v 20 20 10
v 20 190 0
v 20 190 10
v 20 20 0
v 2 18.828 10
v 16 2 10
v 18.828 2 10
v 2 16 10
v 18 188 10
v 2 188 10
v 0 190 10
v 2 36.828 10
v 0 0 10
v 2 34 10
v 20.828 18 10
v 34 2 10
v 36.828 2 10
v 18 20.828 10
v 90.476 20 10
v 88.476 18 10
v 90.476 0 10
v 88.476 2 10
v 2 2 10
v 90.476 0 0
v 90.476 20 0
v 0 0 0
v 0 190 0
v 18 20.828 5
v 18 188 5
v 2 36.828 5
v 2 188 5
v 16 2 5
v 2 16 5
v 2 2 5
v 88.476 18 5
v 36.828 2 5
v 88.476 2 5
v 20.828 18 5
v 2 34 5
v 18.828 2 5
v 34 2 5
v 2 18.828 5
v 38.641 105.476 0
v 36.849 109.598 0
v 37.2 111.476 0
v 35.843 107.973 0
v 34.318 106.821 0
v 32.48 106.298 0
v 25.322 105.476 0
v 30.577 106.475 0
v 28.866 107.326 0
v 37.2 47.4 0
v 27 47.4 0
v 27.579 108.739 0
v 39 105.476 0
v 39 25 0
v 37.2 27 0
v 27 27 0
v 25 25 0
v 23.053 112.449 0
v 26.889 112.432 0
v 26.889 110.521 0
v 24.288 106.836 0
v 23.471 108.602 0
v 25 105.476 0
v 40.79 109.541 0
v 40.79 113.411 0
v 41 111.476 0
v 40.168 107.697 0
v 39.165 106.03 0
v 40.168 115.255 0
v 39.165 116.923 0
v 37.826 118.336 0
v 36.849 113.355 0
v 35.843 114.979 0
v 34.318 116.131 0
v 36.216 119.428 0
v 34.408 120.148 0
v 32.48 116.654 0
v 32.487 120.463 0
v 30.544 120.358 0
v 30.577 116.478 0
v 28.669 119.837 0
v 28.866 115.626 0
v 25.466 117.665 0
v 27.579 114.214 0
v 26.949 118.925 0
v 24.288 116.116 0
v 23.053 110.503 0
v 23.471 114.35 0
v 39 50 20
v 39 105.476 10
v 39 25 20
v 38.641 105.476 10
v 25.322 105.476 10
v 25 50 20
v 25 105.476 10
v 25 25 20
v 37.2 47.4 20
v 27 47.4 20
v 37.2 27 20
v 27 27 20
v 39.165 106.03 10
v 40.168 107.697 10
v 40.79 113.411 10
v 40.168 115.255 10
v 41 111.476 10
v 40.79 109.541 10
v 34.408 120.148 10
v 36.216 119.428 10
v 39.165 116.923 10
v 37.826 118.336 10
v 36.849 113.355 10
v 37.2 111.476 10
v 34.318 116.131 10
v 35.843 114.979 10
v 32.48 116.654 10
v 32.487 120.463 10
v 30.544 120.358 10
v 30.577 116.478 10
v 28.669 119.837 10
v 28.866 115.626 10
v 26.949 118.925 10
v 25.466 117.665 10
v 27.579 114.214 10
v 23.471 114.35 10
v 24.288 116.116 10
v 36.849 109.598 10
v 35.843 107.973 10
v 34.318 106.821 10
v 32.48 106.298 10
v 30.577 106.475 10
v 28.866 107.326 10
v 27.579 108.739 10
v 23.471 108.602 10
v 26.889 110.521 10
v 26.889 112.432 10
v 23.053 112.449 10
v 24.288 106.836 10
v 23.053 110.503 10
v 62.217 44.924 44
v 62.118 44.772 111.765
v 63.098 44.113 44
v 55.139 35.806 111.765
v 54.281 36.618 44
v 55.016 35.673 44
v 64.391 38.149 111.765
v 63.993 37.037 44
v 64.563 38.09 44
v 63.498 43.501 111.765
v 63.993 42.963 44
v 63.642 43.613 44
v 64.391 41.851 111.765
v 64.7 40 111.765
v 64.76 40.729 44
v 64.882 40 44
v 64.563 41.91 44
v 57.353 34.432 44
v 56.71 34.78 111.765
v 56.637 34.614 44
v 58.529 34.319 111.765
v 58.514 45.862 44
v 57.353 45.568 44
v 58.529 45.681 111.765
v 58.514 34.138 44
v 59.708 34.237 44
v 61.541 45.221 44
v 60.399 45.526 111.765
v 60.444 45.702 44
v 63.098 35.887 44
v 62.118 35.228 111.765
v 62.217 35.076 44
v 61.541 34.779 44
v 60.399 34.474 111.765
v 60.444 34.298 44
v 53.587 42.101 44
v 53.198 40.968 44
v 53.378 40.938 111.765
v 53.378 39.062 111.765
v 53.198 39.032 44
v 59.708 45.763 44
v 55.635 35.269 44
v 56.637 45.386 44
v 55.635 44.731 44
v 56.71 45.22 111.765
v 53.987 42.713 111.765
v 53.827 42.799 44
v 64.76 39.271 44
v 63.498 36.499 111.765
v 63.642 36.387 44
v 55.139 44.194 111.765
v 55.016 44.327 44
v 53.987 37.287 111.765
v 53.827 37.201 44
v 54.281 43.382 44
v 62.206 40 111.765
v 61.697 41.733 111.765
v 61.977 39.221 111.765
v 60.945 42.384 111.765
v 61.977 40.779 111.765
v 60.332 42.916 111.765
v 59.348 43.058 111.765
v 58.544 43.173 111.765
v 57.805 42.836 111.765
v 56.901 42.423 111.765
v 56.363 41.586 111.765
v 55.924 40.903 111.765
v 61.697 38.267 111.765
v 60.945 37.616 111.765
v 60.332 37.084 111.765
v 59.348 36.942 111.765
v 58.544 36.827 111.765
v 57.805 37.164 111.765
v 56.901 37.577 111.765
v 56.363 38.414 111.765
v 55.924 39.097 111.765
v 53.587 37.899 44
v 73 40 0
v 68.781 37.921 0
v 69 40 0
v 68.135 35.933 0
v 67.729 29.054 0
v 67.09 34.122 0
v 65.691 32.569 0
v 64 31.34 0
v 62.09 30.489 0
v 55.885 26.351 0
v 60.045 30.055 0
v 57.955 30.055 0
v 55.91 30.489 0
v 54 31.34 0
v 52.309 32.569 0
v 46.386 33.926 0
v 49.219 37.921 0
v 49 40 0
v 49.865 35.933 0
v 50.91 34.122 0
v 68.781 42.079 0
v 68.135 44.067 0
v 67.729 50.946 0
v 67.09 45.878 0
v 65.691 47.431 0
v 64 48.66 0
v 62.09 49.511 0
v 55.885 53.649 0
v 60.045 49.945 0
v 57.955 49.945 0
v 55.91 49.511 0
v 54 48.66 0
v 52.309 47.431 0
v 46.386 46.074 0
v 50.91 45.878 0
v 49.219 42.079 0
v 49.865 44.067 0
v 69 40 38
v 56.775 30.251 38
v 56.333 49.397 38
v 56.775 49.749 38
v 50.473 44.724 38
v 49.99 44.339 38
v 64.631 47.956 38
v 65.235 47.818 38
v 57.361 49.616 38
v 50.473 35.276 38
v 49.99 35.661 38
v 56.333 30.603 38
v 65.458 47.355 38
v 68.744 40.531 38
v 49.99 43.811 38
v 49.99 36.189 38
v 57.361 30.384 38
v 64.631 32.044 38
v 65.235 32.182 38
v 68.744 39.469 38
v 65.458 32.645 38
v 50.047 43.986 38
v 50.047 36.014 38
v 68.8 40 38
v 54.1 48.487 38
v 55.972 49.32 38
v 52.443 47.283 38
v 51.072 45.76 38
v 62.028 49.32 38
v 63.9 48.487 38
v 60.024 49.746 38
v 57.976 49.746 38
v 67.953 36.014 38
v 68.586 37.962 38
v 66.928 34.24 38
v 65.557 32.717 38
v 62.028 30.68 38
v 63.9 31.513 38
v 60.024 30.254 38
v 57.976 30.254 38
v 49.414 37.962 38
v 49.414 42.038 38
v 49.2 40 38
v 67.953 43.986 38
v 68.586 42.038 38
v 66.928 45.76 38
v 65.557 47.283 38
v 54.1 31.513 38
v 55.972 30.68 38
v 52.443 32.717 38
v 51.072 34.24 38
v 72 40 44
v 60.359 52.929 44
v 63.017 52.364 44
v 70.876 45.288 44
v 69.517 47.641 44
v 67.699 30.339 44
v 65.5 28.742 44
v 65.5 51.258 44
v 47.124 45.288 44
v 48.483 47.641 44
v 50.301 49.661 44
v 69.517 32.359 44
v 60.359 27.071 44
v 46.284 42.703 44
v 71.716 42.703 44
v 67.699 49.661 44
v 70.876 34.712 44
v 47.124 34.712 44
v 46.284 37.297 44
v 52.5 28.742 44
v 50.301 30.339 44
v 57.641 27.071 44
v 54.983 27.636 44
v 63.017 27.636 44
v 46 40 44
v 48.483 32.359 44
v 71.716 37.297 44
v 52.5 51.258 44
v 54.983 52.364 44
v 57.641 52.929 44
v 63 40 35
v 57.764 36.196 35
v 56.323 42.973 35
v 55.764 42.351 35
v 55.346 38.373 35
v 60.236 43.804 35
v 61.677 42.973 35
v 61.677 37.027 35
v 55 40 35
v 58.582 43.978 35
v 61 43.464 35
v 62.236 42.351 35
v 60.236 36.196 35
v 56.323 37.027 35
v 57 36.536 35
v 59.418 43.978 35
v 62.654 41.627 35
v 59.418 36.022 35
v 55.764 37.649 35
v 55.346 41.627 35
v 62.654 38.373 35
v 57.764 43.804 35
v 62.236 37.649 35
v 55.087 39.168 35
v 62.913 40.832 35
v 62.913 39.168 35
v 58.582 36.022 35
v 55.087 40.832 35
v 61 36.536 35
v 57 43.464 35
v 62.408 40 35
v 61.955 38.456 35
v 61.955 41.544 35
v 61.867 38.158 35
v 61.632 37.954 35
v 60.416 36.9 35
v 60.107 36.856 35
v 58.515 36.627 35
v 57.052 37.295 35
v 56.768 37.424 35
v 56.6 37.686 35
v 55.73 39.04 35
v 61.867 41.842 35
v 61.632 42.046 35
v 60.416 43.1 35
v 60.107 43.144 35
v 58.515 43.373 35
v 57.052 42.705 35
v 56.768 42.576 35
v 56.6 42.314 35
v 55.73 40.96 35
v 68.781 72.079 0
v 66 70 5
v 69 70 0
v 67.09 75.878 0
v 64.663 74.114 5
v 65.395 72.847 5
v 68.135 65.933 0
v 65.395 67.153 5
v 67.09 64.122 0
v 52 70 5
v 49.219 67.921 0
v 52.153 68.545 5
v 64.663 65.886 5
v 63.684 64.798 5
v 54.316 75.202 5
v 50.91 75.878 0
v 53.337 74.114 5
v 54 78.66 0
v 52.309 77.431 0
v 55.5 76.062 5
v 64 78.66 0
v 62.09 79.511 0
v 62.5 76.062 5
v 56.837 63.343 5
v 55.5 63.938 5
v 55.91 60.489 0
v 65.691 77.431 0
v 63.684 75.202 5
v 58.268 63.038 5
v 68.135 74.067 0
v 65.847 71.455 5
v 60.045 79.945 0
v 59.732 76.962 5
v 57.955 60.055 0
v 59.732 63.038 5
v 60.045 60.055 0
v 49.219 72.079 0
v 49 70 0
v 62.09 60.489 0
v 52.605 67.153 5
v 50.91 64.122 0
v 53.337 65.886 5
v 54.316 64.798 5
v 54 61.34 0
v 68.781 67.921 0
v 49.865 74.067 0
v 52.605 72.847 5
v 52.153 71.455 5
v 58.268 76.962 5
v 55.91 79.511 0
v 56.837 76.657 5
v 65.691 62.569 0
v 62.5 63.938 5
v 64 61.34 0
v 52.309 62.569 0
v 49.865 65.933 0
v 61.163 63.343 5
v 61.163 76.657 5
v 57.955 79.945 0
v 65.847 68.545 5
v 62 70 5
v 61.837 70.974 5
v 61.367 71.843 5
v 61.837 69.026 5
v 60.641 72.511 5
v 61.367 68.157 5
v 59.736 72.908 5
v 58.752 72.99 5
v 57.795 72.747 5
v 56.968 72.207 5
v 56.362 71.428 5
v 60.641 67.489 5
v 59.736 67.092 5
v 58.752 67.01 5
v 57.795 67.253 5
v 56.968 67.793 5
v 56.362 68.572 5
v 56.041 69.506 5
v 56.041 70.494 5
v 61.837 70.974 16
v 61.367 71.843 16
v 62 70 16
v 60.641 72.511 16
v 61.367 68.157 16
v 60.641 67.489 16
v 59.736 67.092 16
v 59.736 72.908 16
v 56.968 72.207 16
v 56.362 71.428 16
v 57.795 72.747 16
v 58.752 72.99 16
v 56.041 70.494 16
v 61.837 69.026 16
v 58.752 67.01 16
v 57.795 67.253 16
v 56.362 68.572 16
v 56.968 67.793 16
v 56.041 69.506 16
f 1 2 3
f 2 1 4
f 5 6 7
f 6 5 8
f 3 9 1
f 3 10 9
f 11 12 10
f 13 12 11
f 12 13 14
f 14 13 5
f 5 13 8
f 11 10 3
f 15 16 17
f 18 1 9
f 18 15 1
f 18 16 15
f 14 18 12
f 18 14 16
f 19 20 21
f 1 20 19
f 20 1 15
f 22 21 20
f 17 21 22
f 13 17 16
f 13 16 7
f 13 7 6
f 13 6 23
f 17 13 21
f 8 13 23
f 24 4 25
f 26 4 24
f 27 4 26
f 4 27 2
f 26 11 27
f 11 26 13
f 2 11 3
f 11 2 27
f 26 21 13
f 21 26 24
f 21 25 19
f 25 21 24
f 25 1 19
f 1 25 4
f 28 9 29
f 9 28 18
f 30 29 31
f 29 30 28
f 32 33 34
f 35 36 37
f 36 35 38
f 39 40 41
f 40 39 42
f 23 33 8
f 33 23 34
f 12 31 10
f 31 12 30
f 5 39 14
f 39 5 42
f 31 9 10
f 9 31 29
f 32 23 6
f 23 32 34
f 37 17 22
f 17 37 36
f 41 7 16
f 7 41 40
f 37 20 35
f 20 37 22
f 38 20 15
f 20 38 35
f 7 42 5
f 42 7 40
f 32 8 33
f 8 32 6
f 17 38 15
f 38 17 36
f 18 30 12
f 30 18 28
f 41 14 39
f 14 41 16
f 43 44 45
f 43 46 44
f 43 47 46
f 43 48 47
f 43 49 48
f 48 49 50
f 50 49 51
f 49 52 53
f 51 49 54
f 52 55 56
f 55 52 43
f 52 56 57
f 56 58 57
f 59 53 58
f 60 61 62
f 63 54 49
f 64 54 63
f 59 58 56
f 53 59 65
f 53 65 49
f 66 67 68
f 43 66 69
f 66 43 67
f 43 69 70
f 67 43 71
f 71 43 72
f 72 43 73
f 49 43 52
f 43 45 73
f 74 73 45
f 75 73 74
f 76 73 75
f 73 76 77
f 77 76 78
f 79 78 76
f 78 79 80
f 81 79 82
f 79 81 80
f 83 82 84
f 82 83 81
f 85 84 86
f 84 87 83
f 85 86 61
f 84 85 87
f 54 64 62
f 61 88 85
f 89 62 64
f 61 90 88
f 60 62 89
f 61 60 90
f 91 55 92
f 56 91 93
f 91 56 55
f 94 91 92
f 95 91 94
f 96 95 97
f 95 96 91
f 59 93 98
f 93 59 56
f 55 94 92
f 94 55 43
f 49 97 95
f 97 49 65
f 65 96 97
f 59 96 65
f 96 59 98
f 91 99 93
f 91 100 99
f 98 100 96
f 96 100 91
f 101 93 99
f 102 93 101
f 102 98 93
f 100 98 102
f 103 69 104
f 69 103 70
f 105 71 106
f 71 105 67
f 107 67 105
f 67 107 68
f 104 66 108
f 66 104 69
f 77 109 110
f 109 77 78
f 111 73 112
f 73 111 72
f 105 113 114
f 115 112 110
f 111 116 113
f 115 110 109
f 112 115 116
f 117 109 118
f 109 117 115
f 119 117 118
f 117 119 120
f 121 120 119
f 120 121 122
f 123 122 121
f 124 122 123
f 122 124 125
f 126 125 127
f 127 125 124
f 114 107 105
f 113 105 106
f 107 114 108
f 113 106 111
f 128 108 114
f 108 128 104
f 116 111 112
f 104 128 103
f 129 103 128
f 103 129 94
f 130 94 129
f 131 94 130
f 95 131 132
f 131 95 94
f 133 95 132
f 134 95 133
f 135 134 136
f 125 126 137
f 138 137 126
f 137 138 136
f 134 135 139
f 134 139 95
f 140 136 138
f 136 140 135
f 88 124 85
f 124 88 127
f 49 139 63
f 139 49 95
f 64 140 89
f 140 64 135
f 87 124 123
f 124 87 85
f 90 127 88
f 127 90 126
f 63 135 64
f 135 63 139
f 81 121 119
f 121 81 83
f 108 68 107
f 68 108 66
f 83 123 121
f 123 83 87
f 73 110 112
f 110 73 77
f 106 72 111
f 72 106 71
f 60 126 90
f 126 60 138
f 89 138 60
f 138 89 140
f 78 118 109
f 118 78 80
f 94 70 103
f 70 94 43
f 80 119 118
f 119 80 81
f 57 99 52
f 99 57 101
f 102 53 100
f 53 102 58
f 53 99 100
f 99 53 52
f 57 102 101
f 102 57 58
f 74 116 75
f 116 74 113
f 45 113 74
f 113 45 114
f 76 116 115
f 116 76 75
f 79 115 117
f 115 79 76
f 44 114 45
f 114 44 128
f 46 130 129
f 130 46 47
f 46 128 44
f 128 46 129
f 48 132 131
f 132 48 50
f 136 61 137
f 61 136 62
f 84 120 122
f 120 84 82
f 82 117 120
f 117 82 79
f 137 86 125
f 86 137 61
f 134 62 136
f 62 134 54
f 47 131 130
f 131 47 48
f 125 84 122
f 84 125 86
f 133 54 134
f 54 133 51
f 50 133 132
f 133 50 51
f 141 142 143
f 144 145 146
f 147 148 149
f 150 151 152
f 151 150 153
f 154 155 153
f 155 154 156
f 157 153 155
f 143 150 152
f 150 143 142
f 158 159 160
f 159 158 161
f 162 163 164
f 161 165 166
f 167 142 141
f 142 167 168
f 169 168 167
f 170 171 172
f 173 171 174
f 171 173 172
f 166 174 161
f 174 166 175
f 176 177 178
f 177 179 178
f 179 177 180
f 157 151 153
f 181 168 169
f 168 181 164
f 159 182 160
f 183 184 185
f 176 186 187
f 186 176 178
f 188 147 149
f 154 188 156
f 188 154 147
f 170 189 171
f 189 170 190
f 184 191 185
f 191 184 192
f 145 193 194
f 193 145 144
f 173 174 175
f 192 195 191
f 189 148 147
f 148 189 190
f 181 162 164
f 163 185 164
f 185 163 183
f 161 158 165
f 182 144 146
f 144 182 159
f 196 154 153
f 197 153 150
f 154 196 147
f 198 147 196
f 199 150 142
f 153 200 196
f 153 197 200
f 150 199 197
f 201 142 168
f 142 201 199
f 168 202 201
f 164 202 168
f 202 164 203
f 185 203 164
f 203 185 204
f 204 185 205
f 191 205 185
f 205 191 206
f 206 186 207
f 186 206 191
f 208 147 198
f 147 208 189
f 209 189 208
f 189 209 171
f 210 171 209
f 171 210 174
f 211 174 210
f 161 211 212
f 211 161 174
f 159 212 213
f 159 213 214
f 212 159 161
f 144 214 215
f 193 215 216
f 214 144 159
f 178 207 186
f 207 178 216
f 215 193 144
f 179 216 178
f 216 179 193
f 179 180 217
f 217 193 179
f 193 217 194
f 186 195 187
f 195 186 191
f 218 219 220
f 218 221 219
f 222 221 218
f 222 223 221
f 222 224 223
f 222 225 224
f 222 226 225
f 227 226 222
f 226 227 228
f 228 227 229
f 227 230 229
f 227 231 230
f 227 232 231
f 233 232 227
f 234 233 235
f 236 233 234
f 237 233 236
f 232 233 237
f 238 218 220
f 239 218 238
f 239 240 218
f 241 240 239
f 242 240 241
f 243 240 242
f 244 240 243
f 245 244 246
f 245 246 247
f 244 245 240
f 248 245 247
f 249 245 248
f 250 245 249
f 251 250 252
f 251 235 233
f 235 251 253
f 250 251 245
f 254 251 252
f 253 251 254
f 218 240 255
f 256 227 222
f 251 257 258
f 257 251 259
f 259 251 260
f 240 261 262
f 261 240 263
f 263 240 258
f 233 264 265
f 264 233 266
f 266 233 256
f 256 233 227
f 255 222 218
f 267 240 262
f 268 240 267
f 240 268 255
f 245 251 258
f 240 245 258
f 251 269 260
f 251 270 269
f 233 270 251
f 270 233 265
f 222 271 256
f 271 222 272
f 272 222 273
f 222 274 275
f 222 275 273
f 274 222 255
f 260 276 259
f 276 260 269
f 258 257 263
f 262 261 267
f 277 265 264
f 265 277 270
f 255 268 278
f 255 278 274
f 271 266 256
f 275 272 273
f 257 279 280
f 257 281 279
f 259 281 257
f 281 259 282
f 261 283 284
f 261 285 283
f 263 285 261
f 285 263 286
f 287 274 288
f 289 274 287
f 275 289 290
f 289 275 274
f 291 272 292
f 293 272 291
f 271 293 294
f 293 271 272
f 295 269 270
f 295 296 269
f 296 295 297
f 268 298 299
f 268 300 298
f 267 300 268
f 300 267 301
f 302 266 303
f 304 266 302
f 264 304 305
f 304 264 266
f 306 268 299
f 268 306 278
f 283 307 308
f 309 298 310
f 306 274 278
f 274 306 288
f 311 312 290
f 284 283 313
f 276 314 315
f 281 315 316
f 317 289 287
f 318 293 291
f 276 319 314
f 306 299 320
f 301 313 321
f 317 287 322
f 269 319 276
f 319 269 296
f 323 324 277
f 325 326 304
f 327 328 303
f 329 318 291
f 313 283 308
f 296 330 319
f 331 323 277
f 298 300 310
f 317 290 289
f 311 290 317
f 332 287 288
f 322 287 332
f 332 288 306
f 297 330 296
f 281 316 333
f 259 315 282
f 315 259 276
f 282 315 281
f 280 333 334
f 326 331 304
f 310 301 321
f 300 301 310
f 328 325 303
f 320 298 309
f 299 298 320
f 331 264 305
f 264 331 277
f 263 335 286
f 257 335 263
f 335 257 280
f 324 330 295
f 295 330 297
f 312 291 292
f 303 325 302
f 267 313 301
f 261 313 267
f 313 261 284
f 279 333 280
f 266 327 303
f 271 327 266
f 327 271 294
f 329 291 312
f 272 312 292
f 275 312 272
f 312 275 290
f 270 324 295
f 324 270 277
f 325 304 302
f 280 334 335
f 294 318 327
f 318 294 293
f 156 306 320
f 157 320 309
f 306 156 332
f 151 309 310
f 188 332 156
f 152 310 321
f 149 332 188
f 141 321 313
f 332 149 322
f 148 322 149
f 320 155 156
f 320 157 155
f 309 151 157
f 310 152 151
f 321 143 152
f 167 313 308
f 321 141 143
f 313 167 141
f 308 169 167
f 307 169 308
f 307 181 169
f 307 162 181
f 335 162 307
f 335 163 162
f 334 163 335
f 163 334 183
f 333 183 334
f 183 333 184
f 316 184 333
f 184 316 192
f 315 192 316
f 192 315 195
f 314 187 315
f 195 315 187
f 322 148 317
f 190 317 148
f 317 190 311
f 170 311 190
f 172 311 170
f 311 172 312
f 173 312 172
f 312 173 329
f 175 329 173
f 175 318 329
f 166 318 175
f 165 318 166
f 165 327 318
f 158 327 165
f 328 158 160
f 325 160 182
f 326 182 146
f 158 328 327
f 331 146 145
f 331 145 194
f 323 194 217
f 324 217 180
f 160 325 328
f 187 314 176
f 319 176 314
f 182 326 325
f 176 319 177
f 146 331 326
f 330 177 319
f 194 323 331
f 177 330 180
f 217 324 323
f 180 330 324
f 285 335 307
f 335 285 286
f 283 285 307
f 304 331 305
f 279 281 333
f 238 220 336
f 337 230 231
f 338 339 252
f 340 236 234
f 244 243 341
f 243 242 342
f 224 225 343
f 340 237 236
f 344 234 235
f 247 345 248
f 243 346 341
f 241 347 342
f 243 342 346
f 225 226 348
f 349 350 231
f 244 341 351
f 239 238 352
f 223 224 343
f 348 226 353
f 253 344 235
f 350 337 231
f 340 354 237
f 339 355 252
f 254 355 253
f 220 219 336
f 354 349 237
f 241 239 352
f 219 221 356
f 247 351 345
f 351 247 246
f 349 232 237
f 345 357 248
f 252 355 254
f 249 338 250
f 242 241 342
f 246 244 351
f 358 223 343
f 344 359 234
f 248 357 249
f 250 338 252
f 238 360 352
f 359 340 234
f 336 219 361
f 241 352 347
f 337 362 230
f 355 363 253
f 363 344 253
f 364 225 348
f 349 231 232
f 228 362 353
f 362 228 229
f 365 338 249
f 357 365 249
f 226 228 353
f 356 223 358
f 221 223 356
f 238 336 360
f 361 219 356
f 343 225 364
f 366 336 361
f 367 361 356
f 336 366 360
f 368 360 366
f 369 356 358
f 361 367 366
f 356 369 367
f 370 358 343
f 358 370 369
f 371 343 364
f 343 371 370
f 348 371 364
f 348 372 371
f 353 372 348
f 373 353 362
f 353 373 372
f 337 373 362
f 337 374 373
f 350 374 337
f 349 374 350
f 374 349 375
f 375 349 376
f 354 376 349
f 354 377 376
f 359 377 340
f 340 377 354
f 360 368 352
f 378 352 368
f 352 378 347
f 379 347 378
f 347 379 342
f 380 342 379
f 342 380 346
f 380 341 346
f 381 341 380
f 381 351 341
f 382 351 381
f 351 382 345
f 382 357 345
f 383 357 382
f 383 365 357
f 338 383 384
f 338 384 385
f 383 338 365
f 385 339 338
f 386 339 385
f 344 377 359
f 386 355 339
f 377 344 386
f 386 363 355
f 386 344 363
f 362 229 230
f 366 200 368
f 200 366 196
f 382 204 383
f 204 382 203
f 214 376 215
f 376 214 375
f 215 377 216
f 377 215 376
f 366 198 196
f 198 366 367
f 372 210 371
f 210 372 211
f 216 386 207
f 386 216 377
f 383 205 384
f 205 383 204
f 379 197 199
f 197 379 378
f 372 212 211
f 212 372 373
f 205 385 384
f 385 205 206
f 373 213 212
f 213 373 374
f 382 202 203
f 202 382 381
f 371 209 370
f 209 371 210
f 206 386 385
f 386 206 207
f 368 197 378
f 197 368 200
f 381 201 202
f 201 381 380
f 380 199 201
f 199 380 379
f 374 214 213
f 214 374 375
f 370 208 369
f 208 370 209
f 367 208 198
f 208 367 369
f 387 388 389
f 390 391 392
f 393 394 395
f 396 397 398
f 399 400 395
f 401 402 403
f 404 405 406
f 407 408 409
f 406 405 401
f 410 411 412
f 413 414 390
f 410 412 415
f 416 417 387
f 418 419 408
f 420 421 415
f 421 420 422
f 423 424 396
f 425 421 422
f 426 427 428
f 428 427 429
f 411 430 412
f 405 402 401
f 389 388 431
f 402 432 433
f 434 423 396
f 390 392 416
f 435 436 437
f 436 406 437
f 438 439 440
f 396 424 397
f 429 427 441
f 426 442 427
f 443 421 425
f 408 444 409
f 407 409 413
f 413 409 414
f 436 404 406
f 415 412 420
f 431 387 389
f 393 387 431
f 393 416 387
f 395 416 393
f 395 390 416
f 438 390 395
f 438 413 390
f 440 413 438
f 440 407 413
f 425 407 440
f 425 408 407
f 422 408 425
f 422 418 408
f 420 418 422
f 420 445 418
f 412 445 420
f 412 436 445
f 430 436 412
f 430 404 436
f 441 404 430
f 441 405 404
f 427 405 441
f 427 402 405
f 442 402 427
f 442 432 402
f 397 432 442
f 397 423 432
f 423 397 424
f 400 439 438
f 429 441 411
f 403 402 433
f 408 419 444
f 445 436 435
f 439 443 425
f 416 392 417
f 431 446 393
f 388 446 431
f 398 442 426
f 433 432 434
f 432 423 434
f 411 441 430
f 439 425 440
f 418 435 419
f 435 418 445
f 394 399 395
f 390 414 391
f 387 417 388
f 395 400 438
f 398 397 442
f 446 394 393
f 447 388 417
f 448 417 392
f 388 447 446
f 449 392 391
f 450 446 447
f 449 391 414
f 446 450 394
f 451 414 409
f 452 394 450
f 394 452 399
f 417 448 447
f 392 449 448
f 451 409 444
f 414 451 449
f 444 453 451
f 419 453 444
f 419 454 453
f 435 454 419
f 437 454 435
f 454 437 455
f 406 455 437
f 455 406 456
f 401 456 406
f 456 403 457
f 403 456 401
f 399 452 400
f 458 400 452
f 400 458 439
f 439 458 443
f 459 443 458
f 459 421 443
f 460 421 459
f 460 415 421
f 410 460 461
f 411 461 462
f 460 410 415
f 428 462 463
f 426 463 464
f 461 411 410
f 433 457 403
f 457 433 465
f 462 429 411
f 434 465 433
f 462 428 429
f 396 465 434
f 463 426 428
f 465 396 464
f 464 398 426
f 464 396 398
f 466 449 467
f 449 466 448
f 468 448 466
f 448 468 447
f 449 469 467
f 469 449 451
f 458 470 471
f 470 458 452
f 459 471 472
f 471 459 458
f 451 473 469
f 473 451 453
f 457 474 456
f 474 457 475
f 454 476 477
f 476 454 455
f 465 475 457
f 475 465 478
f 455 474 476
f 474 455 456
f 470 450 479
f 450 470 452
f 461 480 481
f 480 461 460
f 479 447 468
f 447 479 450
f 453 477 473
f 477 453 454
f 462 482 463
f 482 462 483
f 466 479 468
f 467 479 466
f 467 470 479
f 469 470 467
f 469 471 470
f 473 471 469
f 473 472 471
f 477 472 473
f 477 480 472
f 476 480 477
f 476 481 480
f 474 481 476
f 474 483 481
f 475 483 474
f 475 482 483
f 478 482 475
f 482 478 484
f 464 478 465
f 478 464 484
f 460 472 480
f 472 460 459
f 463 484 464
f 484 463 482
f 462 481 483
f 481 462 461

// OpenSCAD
//Size of the bar clamp
len = 190; // [90:300]
wid=len/2.1;
rw=min(wid/4,14);
th=min(len/6,20);
// Type of the bar clamp grip
grip=14; //[20:Five-edge,14:Edged, 8:Semiround, 1:Round]
//Thickness of the barclamp
flat=10; //[5:Flat,10:Normal, 15:Thick]

winkel();
translate([th+5,th+5,0]) span(); 
translate([th+15+flat+rw,th+20,0]) bolt();
translate([th+15+flat+rw,th+50,0]) boltcap();


module boltcap(){
	cylinder(h=5,r=rw-4,r2=rw-7);
	cylinder(h=16,r=3,$fs=1);
}


module bolt(){

difference(){
union(){
	cylinder(h=len/1.7,r=6,r2=5.7);
	cylinder(h=len/5,r=rw, r2=rw-4, $fs=grip);
	translate([0,0,len/5]) cylinder(h=6,r=rw-4.2,r2=rw-1);

}
cylinder(h=len/5-3,r=rw-4, r2=rw-10);
cylinder(h=len,r=3.5,r2=3);
}
}

module span(){
sh=min(th,20);
difference(){
union(){
hull(){
	cube([flat+4,th+5,sh]);
	cube([flat+4,wid-10,sh/2]);
}
	translate([(flat+4)/2,wid-4,0]) cylinder(h=sh/2,r=9);
}
translate([2,2,0]) cube([flat+0.2,th+0.4,sh]);
translate([(flat+4)/2,wid-4,0]) cylinder(h=15,r=5.2);
}
}



module winkel(){
difference(){
union(){
cube([th,len,flat]);
cube([wid,th,flat]);
}
translate([2,2,flat/2]) cube([th-4,len-4,flat]);
translate([2,2,flat/2])  cube([wid-4,th-4,flat]);
}

pos=(th*2)-4;
c=sqrt(pos*pos+pos*pos);

translate([0,pos/2,0]) rotate([0,0,-45]) cube([c/2,2,flat]);
translate([0,pos,0]) rotate([0,0,-45]) cube([c,2,flat]);


}
